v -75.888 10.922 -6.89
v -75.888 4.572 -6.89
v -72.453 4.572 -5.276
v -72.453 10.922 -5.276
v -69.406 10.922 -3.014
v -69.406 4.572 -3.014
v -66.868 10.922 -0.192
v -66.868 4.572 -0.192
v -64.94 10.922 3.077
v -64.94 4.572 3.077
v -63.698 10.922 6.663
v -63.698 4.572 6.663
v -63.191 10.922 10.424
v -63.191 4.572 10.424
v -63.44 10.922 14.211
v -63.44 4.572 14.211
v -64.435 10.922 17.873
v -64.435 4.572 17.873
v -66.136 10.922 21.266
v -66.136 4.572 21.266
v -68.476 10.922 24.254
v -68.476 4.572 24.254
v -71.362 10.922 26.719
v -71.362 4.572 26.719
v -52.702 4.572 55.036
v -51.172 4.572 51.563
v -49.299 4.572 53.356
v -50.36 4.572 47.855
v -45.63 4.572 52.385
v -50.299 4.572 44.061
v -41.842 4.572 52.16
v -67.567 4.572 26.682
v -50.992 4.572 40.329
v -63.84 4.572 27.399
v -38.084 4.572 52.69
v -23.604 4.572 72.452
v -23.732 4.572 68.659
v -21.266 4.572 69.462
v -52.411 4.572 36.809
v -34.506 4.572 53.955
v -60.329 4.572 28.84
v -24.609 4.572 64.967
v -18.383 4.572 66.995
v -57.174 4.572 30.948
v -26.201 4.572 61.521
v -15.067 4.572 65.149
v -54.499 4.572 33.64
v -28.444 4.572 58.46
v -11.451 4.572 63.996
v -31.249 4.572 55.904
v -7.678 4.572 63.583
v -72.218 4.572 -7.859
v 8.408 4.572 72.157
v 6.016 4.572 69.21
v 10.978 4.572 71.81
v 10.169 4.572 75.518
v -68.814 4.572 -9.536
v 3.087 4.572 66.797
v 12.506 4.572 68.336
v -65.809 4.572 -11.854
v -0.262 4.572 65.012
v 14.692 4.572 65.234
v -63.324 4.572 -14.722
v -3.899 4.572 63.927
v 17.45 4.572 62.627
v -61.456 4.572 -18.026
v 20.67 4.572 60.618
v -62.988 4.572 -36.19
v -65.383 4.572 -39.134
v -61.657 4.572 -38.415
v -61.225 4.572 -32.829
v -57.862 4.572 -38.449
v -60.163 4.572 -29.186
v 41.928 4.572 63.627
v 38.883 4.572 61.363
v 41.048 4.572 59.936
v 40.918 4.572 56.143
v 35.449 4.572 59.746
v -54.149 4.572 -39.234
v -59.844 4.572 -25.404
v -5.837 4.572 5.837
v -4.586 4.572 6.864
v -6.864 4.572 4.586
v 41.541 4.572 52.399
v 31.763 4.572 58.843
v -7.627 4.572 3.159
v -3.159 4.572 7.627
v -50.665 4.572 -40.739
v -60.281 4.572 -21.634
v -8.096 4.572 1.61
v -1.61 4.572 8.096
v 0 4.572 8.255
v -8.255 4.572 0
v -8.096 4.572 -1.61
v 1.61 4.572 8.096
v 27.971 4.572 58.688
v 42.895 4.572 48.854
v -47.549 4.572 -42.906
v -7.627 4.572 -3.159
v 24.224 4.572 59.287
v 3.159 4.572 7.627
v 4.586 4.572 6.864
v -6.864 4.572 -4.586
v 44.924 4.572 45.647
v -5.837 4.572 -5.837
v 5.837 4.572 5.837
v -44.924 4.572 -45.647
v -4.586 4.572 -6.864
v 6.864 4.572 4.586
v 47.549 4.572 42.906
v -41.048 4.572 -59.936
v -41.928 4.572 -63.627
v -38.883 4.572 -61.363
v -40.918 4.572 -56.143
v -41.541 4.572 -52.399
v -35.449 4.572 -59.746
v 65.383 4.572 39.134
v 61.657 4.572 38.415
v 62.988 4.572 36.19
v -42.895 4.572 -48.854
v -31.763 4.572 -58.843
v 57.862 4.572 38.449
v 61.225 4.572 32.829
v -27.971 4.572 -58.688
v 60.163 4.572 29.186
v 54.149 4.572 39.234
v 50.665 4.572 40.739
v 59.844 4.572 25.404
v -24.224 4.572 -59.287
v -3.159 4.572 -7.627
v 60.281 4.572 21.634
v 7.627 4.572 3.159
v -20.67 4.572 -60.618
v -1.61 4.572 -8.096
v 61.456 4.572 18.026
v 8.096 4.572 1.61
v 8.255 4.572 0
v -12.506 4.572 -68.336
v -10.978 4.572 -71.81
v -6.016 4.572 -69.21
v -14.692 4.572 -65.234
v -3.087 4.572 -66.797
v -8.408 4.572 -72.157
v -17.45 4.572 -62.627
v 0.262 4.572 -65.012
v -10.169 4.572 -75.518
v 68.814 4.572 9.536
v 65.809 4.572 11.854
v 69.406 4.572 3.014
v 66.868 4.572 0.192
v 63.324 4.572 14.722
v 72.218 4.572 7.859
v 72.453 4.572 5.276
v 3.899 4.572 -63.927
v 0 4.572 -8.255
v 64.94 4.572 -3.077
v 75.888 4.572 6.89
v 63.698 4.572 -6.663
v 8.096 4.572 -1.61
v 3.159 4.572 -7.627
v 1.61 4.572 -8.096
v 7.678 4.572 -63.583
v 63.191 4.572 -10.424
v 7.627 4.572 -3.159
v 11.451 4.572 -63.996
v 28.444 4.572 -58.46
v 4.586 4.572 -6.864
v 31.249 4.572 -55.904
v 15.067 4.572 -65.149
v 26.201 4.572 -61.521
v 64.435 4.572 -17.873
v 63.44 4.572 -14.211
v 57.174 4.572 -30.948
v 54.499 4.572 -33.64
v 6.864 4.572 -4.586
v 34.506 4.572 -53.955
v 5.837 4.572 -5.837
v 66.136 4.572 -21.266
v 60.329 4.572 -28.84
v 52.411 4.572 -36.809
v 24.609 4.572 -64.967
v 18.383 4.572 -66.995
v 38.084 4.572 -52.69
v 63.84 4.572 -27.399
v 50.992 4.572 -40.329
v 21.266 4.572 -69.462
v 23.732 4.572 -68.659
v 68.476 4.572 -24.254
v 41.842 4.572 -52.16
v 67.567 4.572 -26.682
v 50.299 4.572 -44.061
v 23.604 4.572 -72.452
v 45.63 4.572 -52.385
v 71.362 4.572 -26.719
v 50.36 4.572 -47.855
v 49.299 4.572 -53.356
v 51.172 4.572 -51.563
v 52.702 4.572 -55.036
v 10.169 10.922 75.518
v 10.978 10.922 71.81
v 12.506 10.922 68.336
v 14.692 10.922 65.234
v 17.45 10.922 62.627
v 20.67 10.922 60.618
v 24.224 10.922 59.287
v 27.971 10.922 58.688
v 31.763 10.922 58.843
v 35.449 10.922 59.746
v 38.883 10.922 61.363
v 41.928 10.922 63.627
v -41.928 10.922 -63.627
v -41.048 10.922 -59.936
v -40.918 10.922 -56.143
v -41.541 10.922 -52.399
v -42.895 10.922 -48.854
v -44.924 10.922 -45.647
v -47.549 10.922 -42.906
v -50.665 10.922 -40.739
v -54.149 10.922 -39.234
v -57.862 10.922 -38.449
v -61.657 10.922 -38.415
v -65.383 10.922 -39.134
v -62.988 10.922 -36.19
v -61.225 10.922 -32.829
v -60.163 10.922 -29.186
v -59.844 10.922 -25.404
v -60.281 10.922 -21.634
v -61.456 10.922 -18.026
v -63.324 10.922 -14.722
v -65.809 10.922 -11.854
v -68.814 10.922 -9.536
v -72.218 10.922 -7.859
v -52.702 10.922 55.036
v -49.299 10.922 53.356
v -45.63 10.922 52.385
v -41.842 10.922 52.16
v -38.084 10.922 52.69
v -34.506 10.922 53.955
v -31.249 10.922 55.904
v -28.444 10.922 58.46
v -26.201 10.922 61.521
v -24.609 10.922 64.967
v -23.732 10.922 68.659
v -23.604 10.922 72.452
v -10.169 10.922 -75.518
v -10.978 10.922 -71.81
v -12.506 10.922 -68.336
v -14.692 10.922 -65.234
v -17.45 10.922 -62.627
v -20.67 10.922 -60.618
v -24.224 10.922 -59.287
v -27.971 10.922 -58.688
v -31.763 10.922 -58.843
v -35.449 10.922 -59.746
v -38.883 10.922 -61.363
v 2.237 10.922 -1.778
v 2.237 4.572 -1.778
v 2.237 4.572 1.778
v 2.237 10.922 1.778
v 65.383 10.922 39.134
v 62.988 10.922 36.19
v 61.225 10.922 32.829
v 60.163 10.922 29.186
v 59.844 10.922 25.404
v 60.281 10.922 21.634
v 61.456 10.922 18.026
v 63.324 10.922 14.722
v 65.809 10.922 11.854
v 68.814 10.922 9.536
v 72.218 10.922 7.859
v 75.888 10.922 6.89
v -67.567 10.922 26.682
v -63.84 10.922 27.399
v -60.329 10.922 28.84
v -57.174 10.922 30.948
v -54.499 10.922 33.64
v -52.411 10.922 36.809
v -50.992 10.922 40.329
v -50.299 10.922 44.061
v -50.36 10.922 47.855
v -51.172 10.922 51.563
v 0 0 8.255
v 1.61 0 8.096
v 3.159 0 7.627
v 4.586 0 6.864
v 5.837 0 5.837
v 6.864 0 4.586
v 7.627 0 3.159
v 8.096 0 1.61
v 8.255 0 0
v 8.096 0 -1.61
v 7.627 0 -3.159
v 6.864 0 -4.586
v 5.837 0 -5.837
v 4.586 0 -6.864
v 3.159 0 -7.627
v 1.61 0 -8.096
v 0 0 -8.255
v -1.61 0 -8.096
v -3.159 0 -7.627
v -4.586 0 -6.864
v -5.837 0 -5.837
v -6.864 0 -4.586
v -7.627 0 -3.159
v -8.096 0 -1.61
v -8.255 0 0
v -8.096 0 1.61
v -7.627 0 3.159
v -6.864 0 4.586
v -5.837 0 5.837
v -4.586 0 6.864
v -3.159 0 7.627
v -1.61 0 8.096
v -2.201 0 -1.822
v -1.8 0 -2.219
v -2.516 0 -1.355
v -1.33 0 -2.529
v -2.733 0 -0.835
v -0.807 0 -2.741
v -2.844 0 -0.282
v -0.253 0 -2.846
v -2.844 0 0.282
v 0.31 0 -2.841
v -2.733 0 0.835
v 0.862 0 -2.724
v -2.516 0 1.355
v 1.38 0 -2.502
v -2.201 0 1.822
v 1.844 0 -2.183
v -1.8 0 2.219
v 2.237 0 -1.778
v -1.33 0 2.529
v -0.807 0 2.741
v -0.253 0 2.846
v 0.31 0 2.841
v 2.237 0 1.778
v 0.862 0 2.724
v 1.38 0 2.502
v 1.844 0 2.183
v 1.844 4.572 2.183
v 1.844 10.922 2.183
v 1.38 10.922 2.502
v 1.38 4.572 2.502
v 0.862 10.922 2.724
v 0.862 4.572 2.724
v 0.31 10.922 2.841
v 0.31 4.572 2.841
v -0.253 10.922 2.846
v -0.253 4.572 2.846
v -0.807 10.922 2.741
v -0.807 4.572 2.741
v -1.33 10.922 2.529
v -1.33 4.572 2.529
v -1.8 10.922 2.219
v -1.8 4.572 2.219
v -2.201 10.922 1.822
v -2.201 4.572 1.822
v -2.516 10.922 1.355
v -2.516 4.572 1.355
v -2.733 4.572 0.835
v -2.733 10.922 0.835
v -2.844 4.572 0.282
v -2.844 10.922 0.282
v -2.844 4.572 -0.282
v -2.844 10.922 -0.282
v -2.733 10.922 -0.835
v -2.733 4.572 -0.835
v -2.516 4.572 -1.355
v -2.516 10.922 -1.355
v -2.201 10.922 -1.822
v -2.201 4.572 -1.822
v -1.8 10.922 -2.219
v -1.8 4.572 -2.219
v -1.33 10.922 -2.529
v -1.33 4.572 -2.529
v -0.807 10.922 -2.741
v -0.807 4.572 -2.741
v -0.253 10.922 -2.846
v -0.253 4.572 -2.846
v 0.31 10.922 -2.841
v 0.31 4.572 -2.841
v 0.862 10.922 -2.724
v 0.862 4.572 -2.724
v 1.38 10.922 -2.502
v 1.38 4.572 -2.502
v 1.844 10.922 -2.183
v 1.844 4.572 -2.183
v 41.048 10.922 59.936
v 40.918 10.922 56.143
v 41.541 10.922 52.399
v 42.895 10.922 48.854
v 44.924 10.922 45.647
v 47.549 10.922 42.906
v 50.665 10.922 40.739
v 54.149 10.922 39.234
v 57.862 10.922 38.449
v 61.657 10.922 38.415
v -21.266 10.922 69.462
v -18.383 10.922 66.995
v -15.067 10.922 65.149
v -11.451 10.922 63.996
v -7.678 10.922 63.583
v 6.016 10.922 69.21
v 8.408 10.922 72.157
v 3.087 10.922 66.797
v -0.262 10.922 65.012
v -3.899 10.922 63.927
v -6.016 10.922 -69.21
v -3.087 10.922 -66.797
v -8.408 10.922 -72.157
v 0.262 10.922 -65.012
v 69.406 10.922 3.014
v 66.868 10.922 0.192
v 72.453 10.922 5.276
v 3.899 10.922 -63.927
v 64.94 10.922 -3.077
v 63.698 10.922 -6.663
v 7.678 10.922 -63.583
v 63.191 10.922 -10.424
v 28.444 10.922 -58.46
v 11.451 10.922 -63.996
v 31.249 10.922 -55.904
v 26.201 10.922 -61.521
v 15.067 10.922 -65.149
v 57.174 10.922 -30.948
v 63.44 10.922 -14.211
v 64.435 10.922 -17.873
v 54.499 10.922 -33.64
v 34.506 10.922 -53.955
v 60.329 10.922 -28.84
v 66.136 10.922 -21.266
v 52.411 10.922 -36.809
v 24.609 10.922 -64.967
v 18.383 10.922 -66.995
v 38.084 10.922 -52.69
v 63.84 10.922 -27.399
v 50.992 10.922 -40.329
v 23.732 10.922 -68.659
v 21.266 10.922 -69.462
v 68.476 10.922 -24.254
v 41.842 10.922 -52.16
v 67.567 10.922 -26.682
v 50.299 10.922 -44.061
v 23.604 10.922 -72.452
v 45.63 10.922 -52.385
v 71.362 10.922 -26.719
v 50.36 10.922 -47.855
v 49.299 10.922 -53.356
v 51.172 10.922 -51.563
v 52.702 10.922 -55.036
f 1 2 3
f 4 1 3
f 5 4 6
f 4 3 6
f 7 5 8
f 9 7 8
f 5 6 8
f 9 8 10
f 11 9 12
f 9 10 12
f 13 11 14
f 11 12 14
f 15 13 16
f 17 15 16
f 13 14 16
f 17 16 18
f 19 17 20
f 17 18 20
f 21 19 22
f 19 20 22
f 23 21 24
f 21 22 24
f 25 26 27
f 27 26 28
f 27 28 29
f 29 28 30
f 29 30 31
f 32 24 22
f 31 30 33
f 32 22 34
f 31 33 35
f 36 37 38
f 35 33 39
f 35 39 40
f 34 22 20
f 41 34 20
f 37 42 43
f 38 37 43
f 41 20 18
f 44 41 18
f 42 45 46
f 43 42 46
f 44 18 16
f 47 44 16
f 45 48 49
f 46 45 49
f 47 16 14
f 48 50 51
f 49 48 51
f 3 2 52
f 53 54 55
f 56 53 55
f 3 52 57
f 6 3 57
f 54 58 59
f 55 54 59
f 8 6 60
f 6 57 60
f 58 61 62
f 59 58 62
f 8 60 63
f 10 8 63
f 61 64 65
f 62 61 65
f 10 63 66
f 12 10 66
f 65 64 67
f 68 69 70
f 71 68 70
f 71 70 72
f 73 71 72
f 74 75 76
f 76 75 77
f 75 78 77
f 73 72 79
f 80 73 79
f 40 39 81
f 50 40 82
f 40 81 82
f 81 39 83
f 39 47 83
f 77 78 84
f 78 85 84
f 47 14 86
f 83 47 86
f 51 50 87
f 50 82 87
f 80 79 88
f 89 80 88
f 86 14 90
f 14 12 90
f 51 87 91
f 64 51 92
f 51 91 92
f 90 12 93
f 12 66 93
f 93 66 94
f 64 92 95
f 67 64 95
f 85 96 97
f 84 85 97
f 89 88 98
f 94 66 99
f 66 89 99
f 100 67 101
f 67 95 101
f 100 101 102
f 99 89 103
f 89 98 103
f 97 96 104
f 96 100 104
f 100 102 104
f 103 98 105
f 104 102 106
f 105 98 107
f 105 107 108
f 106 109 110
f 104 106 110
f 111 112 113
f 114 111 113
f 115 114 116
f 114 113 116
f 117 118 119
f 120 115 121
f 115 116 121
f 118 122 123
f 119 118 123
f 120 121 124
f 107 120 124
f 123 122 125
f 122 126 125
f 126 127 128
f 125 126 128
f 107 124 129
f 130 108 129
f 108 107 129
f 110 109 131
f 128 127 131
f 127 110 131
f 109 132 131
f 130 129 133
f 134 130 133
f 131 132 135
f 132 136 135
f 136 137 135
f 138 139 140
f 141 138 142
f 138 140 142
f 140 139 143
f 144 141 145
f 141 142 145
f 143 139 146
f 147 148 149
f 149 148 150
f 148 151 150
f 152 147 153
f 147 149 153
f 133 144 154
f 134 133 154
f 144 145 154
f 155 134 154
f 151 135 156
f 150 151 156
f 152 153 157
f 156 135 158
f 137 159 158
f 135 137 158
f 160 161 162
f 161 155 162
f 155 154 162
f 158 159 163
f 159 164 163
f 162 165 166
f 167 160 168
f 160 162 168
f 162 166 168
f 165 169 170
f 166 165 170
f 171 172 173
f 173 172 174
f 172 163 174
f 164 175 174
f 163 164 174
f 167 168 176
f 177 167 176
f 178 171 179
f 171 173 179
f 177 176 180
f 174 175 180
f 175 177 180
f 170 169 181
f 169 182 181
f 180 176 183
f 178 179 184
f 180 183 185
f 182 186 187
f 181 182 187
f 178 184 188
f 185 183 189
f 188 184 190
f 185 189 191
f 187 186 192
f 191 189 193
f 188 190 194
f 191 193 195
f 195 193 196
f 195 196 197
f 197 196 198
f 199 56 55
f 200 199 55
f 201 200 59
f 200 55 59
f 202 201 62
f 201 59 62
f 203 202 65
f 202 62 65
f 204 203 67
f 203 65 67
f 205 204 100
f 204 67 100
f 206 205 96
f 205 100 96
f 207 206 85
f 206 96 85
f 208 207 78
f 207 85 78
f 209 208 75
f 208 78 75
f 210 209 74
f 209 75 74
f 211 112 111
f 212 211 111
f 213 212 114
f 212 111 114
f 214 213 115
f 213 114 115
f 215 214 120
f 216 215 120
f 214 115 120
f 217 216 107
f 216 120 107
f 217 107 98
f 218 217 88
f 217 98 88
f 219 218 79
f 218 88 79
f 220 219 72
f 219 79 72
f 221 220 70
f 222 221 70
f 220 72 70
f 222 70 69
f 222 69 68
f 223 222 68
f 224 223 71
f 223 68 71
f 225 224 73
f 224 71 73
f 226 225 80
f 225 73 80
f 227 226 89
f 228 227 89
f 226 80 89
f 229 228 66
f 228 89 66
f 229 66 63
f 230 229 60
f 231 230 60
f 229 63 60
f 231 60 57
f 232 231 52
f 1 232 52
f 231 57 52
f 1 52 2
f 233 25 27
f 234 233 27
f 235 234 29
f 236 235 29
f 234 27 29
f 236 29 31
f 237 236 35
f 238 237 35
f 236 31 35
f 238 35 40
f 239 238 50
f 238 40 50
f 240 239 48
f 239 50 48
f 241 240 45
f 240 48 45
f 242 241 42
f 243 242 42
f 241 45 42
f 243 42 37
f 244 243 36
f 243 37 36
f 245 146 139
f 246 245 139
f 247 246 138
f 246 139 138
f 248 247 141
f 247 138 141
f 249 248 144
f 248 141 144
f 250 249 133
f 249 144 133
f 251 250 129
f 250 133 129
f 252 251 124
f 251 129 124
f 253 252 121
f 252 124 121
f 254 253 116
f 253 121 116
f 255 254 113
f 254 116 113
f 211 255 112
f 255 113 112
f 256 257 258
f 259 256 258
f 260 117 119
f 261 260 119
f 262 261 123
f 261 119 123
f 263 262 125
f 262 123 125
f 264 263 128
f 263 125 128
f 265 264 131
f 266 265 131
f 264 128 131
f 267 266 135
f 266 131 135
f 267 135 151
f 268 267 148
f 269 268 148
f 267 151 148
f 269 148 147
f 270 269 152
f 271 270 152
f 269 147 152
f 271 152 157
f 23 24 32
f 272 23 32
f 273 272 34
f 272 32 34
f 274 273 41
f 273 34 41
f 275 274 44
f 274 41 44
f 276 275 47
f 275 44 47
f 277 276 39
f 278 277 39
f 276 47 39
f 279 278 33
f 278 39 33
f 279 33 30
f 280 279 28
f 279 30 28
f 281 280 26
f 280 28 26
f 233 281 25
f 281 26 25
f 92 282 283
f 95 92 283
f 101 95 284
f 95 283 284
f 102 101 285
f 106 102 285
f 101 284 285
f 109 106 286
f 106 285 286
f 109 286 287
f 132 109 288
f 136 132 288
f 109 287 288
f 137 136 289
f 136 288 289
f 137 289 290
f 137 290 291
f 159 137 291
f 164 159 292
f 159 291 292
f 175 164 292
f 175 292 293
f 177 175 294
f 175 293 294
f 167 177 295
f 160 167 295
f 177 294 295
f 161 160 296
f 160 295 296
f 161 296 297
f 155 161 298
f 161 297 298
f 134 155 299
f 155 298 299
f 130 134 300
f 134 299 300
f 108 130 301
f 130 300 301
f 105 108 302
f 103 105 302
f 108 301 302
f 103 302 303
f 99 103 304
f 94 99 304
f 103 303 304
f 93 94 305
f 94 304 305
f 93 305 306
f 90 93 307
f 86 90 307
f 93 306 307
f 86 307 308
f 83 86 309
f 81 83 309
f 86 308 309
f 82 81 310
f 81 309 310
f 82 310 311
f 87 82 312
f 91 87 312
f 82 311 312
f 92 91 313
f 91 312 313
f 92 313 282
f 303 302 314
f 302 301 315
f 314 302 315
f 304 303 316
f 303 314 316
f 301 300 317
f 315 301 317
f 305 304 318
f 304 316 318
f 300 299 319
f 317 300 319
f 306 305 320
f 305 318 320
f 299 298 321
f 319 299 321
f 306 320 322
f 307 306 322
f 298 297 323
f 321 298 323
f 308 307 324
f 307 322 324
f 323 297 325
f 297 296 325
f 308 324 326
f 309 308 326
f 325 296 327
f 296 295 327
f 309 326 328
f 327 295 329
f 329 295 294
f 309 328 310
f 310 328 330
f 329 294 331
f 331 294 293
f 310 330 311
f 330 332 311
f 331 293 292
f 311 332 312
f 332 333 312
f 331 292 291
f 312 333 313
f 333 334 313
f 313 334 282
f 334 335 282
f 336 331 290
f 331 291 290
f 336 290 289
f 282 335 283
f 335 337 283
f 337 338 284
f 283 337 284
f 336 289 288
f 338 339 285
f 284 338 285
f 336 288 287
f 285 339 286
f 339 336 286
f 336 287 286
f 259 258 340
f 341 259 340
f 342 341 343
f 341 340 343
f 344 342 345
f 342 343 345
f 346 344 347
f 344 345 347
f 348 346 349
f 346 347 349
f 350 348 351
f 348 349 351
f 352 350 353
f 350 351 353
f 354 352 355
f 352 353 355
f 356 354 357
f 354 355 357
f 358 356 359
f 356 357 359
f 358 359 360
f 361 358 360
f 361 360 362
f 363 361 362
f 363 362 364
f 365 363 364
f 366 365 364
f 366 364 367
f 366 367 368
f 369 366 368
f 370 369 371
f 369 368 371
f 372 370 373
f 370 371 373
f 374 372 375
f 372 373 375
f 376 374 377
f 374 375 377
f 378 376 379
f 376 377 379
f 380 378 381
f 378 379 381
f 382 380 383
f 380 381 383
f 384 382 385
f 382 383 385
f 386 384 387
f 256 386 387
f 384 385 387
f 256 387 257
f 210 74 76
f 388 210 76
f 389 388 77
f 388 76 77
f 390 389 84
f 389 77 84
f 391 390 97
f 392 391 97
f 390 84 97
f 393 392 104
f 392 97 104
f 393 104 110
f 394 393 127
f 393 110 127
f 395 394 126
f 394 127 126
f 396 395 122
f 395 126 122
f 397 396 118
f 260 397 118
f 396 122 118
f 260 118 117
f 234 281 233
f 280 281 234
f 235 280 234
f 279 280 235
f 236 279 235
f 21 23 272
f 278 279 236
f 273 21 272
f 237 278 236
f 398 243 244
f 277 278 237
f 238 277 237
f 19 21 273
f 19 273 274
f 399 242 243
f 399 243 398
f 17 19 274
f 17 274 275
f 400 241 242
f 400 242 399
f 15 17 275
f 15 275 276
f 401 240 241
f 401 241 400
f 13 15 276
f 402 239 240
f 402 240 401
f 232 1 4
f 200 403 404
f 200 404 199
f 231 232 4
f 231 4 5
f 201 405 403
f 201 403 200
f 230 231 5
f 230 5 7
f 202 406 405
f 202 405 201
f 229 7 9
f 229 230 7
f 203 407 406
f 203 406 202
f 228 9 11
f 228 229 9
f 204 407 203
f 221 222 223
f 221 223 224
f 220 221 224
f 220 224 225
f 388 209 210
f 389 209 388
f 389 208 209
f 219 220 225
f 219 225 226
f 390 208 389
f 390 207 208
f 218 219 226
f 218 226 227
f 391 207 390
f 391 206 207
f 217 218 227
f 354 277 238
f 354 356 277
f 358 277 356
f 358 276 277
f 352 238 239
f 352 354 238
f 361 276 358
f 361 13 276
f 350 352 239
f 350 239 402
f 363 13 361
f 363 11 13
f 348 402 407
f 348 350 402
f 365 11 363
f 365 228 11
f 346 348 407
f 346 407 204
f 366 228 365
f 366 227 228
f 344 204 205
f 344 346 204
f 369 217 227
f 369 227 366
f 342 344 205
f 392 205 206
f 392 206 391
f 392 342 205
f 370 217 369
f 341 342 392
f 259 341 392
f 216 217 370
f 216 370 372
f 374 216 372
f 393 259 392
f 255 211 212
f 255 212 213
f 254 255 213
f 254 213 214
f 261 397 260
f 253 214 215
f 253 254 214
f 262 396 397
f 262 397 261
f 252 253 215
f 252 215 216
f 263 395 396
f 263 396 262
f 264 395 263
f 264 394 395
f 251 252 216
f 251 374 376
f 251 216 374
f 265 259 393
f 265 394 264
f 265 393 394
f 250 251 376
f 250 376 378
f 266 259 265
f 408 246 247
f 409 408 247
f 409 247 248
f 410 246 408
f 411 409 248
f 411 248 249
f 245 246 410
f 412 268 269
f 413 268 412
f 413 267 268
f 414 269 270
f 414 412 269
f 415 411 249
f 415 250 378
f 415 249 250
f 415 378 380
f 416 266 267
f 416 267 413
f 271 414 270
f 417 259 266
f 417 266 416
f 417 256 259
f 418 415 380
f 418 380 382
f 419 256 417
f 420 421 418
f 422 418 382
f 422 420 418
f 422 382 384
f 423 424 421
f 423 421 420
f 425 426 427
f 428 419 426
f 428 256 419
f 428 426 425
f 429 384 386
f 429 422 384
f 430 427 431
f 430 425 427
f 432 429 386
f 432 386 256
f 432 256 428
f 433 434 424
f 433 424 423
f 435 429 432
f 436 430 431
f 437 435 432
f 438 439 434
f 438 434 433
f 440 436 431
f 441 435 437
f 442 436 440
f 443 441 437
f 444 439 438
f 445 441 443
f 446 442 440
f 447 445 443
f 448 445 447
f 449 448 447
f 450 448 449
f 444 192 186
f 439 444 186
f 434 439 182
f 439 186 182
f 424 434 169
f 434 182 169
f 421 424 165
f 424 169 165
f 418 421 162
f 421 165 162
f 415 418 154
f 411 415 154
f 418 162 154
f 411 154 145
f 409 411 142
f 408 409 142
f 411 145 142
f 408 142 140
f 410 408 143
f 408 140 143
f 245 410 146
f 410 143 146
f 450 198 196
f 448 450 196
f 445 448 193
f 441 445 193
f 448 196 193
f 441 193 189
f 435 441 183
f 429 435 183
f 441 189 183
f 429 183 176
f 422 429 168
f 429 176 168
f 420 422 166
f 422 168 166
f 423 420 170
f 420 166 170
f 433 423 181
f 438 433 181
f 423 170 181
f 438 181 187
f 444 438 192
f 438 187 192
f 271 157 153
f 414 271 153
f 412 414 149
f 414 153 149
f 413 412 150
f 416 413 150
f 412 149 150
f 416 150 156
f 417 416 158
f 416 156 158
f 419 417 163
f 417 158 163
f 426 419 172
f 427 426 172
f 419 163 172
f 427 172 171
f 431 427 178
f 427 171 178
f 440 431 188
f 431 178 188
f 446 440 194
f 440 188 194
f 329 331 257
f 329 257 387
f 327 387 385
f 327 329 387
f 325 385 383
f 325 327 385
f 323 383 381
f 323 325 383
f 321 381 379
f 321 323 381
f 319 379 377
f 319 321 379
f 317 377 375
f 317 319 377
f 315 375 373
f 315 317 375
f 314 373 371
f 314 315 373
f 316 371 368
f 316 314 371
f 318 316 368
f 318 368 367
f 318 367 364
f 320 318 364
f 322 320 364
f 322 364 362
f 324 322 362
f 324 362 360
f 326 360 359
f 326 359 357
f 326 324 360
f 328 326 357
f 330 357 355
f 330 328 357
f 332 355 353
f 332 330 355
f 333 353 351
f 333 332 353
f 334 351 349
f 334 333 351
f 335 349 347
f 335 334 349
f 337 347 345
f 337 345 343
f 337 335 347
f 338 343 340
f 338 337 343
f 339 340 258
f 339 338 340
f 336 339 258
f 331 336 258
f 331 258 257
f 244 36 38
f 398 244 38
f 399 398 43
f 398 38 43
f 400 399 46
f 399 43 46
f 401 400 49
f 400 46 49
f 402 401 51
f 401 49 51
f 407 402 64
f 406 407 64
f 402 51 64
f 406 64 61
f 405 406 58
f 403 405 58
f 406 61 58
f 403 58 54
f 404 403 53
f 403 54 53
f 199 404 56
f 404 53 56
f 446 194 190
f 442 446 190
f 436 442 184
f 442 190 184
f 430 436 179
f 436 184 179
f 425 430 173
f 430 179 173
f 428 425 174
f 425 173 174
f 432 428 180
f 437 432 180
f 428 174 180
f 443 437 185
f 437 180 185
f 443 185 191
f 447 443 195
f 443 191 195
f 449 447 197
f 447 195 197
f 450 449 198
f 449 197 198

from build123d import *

# Parameters (mm, degrees)
SKETCH1_R           = 8.255
BOSS_EXTRUDE1_DEPTH = 4.572
BOSS_EXTRUDE2_DEPTH = 6.35


with BuildPart() as part:
    # Sketch1 → Boss-Extrude1 (new body)
    with BuildSketch(Plane(origin=(0, 0, 0), x_dir=(1, 0, 0), z_dir=(0, 1, 0))):
        Circle(SKETCH1_R)
        with BuildLine():
            Line((2.236967199, -1.778), (2.236967199, 1.778))
            ThreePointArc((2.236967199, 1.778), (-2.8575, 0), (2.236967199, -1.778))
        make_face(mode=Mode.SUBTRACT)
    extrude(amount=BOSS_EXTRUDE1_DEPTH)

    # Sketch2 → Boss-Extrude2 (add)
    with BuildSketch(Plane(origin=(0, 4.572, 0), x_dir=(1, 0, 0), z_dir=(0, 1, 0))):
        with BuildLine():
            ThreePointArc((-10.169246297, 75.518384714), (-22.413710496, 59.86404587), (-41.928373455, 63.627442974))
            ThreePointArc((-41.928373455, 63.627442974), (-46.168091432, 44.210697118), (-65.383072033, 39.134305814))
            ThreePointArc((-65.383072033, 39.134305814), (-60.778315646, 19.800877593), (-75.887851324, 6.890139437))
            ThreePointArc((-75.887851324, 6.890139437), (-63.350649048, -8.530748581), (-71.362110957, -26.718703558))
            ThreePointArc((-71.362110957, -26.718703558), (-53.375609462, -35.172755376), (-52.702229316, -55.03557963))
            ThreePointArc((-52.702229316, -55.03557963), (-32.828875813, -54.848366603), (-23.604024808, -72.451984189))
            ThreePointArc((-23.604024808, -72.451984189), (-5.779980689, -63.660586154), (10.169246297, -75.518384714))
            ThreePointArc((10.169246297, -75.518384714), (22.413710496, -59.86404587), (41.928373455, -63.627442974))
            ThreePointArc((41.928373455, -63.627442974), (46.168091432, -44.210697118), (65.383072033, -39.134305814))
            ThreePointArc((65.383072033, -39.134305814), (60.778315646, -19.800877593), (75.887851324, -6.890139437))
            ThreePointArc((75.887851324, -6.890139437), (63.350649048, 8.530748581), (71.362110957, 26.718703558))
            ThreePointArc((71.362110957, 26.718703558), (53.375609462, 35.172755376), (52.702229316, 55.03557963))
            ThreePointArc((52.702229316, 55.03557963), (32.828875813, 54.848366603), (23.604024808, 72.451984189))
            ThreePointArc((23.604024808, 72.451984189), (5.779980689, 63.660586154), (-10.169246297, 75.518384714))
        make_face()
        with BuildLine():
            Line((2.236967199, 1.778), (2.236967199, -1.778))
            ThreePointArc((2.236967199, -1.778), (-2.8575, 0), (2.236967199, 1.778))
        make_face(mode=Mode.SUBTRACT)
    extrude(amount=BOSS_EXTRUDE2_DEPTH)


solid = part.part
